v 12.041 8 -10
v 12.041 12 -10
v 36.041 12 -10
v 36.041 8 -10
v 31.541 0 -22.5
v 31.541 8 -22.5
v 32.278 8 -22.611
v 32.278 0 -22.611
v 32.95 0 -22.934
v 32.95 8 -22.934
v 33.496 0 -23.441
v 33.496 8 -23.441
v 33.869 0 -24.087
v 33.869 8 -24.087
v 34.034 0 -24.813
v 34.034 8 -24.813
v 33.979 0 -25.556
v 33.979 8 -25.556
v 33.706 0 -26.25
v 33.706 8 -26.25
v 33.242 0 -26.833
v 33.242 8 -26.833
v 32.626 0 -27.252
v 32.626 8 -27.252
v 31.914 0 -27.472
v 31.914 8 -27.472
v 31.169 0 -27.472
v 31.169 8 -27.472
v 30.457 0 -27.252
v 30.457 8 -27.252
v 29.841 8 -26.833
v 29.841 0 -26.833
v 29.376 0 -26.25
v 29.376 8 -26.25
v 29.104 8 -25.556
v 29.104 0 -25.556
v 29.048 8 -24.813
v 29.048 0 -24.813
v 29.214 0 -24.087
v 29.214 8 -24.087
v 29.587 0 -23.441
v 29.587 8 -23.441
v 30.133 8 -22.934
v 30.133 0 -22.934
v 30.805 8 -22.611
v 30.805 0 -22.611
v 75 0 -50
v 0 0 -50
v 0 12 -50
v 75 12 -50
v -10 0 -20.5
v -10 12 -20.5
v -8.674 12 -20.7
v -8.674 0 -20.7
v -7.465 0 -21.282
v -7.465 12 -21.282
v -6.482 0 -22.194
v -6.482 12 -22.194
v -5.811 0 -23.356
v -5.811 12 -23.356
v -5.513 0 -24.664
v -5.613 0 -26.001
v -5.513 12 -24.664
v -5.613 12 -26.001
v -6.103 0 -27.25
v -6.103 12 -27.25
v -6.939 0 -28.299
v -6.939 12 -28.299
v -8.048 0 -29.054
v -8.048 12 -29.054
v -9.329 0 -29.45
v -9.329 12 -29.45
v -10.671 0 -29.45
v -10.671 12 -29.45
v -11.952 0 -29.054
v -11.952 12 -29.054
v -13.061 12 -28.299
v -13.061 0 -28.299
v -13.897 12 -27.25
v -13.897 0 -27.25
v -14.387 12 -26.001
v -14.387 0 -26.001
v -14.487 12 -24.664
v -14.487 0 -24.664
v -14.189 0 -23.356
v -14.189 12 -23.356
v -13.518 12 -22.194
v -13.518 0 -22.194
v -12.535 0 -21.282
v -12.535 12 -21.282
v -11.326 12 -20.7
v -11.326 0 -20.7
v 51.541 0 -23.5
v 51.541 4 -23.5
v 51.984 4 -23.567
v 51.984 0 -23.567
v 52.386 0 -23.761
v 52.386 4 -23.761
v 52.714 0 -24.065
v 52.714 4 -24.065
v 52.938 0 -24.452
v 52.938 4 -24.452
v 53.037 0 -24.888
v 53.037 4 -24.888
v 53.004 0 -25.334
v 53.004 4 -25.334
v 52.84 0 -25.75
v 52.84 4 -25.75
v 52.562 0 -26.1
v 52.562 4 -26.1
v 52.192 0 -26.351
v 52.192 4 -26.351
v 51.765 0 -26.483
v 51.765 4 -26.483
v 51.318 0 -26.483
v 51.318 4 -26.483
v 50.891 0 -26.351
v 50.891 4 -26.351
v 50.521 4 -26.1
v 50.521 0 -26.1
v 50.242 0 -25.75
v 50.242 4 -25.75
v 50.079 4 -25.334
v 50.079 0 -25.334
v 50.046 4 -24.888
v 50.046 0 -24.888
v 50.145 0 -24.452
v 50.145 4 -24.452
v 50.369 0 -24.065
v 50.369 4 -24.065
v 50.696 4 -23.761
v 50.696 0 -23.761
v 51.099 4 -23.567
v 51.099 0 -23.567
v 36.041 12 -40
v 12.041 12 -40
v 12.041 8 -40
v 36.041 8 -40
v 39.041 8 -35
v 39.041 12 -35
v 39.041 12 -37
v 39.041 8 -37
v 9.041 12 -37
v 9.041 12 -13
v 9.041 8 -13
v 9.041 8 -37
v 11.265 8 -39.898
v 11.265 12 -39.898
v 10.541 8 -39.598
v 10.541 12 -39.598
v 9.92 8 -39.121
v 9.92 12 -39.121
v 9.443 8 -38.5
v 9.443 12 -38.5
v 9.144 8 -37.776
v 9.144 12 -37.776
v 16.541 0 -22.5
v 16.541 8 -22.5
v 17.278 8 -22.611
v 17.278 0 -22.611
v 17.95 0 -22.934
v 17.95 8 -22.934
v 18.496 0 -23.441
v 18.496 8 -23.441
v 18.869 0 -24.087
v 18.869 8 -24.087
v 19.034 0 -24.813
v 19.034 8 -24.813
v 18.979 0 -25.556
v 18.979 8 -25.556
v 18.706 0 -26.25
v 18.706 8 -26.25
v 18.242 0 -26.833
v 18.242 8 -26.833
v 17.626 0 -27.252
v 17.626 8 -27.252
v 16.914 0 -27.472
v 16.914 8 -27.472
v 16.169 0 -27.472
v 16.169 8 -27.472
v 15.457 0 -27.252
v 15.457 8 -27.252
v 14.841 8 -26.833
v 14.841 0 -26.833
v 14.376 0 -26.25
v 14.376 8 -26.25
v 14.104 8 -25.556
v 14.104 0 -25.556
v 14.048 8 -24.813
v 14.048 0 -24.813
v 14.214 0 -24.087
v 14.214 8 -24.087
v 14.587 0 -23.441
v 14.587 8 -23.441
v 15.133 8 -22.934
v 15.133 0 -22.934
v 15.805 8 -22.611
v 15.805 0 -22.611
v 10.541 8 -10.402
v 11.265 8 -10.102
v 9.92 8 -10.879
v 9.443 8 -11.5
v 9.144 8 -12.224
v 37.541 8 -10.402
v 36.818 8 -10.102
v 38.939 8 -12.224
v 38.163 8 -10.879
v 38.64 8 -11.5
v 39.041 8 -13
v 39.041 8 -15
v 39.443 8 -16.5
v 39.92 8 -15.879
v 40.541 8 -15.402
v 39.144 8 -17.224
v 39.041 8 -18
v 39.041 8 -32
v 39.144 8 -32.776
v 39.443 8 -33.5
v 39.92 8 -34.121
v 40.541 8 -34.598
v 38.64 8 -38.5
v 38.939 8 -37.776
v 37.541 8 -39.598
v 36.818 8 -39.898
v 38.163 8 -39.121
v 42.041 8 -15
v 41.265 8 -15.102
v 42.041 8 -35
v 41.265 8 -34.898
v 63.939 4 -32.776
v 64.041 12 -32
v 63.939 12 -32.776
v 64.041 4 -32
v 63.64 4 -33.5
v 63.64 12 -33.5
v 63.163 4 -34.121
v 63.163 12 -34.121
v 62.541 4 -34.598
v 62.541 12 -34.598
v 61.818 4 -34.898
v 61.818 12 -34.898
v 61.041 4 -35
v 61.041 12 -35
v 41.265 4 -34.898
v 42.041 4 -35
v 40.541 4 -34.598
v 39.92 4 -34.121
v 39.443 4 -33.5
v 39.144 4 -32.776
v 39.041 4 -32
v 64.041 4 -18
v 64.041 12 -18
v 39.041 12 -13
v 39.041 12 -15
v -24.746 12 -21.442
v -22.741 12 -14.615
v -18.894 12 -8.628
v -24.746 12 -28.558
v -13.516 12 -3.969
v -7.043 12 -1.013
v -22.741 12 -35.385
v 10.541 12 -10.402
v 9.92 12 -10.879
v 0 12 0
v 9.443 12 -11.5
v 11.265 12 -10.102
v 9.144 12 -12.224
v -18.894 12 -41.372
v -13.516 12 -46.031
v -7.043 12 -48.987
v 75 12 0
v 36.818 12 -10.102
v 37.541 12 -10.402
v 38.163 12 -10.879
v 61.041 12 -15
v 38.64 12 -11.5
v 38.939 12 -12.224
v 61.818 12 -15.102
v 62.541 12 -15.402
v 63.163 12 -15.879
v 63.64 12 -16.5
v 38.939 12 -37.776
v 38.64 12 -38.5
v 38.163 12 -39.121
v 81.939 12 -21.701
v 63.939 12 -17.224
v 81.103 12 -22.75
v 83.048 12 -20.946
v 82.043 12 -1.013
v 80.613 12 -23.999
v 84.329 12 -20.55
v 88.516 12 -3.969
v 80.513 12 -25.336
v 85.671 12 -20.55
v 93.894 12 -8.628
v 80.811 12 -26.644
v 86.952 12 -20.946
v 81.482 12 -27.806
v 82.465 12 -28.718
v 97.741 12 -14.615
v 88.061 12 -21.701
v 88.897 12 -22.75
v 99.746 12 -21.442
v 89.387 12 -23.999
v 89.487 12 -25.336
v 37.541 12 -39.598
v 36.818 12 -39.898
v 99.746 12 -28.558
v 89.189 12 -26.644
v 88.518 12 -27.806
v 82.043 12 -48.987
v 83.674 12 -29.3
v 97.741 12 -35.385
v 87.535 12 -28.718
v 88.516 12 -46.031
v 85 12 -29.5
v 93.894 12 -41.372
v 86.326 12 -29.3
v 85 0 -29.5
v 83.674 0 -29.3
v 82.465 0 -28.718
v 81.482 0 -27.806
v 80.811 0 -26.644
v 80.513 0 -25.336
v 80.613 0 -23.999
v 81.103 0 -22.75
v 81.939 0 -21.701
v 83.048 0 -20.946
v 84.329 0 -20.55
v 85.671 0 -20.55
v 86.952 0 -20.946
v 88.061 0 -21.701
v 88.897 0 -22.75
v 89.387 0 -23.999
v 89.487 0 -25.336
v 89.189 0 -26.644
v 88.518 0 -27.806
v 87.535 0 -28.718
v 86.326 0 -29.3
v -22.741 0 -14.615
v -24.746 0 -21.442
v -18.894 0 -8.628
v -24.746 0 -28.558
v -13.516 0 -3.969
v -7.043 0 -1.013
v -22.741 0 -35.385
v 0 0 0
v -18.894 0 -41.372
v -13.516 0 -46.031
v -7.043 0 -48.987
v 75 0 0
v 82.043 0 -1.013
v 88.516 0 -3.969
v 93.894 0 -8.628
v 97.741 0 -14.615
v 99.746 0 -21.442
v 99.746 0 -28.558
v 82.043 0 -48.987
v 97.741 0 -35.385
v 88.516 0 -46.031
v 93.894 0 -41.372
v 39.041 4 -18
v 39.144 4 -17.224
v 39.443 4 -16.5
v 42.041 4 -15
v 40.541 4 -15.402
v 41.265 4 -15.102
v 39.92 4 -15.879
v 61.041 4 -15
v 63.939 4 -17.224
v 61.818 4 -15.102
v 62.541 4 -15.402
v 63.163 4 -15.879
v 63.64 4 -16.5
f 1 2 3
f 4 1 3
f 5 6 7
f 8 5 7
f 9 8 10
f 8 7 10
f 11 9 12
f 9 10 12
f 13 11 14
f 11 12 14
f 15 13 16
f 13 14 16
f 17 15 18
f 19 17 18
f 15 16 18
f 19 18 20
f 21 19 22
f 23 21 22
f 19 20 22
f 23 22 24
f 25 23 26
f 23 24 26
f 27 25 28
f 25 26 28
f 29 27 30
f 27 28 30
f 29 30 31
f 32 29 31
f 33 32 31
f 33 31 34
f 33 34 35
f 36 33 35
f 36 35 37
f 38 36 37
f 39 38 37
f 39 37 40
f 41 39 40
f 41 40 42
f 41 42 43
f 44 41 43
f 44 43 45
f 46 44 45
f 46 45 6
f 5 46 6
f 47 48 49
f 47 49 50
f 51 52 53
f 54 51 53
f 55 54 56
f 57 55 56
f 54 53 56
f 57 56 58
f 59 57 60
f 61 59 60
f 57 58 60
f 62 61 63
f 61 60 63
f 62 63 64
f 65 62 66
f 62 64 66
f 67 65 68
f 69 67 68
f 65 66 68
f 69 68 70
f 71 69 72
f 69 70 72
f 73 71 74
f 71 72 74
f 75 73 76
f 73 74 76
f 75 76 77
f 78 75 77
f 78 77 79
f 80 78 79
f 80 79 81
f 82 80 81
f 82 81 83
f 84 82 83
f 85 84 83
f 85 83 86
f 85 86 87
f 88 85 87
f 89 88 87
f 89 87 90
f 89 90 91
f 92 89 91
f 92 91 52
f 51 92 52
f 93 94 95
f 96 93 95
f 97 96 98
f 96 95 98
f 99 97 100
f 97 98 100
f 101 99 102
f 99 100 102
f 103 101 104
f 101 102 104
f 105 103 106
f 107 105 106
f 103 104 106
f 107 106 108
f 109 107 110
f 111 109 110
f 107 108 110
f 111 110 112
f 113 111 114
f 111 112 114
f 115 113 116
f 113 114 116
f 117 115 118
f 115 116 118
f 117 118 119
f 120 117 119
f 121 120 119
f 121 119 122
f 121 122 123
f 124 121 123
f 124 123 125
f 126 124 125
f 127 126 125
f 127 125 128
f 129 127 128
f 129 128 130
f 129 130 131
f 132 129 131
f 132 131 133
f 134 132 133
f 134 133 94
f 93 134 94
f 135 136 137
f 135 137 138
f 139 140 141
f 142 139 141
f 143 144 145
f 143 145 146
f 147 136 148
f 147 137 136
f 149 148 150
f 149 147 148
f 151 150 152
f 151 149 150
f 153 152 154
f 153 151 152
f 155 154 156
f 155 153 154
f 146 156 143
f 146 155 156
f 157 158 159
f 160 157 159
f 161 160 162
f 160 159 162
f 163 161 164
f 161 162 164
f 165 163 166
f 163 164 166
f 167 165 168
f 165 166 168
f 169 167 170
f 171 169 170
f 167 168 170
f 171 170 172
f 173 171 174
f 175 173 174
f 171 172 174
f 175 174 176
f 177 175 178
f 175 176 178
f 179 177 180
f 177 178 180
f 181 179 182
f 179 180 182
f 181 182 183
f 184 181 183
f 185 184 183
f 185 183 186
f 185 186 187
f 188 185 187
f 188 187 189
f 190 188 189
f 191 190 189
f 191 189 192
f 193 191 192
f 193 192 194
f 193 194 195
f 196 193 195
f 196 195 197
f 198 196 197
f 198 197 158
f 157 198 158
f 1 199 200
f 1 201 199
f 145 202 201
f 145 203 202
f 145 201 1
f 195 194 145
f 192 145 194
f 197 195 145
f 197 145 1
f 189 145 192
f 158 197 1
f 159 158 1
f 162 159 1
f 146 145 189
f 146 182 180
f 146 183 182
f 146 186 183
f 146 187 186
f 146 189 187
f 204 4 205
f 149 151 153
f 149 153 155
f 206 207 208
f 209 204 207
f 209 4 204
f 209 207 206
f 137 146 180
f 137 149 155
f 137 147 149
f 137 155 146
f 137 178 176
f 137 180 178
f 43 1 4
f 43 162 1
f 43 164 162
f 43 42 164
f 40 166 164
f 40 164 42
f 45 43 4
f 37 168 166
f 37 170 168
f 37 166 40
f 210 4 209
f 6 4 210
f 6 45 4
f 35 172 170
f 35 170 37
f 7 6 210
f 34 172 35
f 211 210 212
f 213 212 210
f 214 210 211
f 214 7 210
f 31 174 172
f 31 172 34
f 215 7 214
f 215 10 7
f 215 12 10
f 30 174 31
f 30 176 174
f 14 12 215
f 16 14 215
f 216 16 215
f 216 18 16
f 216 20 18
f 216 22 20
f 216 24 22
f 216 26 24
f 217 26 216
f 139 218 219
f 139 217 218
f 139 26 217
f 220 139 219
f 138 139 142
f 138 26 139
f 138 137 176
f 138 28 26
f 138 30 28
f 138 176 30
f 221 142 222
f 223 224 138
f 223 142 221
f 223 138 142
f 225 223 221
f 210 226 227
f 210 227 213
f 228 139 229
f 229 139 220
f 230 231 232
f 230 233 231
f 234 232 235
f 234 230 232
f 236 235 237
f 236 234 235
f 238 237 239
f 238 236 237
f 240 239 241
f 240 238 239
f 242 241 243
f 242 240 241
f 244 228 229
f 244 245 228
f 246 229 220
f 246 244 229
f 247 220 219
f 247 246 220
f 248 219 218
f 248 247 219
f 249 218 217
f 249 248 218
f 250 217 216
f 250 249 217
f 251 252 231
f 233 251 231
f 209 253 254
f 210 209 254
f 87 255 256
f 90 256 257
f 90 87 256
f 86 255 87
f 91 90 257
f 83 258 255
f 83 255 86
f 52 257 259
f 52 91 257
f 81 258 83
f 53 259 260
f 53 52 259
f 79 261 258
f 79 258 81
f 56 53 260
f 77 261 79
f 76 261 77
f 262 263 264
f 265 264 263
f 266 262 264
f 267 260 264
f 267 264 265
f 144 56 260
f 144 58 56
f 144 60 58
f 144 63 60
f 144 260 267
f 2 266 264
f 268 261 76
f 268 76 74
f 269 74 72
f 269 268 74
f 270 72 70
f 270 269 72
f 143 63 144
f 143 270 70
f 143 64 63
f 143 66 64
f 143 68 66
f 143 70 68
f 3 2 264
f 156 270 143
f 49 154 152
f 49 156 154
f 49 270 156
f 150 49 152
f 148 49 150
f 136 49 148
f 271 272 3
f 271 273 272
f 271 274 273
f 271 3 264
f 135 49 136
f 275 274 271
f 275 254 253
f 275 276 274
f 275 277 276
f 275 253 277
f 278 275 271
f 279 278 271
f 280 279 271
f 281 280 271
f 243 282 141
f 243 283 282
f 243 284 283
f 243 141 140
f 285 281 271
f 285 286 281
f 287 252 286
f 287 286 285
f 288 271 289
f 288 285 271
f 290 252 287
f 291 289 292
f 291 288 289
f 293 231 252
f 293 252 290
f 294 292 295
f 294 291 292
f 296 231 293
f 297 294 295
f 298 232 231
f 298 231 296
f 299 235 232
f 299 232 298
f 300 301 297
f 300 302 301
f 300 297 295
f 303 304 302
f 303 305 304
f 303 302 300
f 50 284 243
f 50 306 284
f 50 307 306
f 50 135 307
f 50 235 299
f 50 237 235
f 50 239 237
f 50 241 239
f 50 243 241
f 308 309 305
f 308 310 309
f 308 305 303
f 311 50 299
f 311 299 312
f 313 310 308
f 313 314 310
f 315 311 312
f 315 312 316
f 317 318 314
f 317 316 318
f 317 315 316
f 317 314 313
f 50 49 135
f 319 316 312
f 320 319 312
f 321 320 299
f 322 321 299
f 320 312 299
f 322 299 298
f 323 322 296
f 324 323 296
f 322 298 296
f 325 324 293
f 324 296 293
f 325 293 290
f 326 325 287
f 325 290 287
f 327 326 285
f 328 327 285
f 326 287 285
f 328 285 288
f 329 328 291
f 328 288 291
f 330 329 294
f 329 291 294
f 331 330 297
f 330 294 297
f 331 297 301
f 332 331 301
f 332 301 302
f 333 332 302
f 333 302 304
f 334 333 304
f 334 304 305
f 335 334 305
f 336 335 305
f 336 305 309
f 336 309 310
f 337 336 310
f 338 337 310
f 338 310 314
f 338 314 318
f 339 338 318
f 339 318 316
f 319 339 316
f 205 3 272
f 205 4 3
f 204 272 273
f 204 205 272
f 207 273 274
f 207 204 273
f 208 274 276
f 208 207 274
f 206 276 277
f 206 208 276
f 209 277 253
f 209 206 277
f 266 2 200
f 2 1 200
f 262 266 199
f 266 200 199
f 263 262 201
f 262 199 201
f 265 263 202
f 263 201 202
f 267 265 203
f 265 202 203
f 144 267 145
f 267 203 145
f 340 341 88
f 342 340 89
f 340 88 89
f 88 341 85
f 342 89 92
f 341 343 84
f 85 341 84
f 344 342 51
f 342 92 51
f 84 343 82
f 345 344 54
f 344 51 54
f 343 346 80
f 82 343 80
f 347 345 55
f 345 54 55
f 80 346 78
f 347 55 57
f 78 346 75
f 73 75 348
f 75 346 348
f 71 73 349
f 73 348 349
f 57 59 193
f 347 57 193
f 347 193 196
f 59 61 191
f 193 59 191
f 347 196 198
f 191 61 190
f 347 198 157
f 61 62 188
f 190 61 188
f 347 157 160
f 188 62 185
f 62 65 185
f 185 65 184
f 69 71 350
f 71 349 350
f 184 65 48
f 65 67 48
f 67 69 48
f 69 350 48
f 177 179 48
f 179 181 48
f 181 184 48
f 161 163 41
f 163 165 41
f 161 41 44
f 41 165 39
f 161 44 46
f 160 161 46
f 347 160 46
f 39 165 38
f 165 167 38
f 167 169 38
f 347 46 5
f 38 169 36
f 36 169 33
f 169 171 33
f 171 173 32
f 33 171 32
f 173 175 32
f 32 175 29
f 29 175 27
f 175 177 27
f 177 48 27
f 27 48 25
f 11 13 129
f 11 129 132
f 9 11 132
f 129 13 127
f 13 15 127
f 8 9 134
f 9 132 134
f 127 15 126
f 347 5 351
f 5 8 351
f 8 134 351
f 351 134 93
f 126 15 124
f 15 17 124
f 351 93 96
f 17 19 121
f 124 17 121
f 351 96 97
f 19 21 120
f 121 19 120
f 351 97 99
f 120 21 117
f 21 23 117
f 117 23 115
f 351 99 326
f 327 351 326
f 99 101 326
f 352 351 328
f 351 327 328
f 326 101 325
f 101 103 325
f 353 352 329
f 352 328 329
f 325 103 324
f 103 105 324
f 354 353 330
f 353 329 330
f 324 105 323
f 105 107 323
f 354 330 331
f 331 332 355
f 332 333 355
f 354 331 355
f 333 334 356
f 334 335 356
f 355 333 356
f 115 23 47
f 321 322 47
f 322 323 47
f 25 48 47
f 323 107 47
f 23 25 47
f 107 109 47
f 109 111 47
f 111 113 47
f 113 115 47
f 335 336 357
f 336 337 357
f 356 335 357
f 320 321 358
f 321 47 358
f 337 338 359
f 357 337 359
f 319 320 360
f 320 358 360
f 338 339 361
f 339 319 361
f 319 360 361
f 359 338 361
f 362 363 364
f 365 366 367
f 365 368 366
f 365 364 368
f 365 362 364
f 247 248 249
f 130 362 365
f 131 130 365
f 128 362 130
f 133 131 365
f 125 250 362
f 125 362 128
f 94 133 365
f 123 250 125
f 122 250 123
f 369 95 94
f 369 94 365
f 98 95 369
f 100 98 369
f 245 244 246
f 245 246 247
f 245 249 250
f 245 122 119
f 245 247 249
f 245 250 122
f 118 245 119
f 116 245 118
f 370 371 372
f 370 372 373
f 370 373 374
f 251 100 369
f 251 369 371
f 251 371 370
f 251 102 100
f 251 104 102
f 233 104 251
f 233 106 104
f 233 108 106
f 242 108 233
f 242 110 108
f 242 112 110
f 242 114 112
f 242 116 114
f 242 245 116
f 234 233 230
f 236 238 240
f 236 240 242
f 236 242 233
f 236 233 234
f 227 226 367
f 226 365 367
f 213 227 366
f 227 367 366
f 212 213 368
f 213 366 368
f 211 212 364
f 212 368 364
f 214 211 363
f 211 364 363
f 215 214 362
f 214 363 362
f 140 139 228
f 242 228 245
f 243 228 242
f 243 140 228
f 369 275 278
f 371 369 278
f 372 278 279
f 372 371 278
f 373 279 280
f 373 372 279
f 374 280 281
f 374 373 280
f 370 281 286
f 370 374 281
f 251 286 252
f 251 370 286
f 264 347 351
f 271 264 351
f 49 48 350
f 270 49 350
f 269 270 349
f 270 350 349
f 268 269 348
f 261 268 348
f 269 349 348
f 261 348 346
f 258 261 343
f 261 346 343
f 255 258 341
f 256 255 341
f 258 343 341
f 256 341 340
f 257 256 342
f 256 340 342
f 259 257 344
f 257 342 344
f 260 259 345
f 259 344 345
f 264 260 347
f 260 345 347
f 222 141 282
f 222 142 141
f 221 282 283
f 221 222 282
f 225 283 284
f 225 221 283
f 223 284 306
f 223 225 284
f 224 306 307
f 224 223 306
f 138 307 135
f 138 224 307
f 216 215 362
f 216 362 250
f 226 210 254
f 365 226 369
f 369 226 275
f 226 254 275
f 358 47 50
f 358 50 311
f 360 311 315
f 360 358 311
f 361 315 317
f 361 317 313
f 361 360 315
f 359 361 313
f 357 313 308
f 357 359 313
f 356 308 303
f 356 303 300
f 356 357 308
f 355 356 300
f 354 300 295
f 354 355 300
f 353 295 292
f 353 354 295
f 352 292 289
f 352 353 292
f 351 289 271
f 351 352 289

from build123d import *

# Parameters (mm, degrees)
SKETCH1_W           = 75
SKETCH1_H           = 50
BOSS_EXTRUDE1_DEPTH = 12
SKETCH2_R           = 4.5
CUT_EXTRUDE1_DEPTH  = 113.445542375
SKETCH3_W           = 30
SKETCH3_H           = 30
CUT_EXTRUDE2_DEPTH  = 4
SKETCH4_W           = 25
SKETCH4_H           = 20
CUT_EXTRUDE3_DEPTH  = 8
FILLET1_R           = 3
SKETCH5_R           = 1.5
CUT_EXTRUDE4_DEPTH  = 113.089250154
SKETCH6_R           = 2.5
CUT_EXTRUDE5_DEPTH  = 113.089250154


with BuildPart() as part:
    # Sketch1 → Boss-Extrude1 (new body)
    with BuildSketch(Plane(origin=(0, 0, 0), x_dir=(1, 0, 0), z_dir=(0, 1, 0))):
        with Locations((37.5, 25)):
            Rectangle(SKETCH1_W, SKETCH1_H)
        with BuildLine():
            Line((75, 0), (75, 50))
            ThreePointArc((75, 50), (100, 25), (75, 0))
        make_face()
        with BuildLine():
            Line((0, 0), (0, 50))
            ThreePointArc((0, 50), (-25, 25), (0, 0))
        make_face()
    extrude(amount=BOSS_EXTRUDE1_DEPTH)

    # Sketch2 → Cut-Extrude1 (cut, through all)
    with BuildSketch(Plane(origin=(0, 12, 0), x_dir=(1, 0, 0), z_dir=(0, 1, 0))):
        with Locations(Location((-10, 25, 0), (0, 0, 270))):
            Circle(SKETCH2_R)
        with Locations(Location((85, 25, 0), (0, 0, 90))):
            Circle(SKETCH2_R)
    extrude(amount=-CUT_EXTRUDE1_DEPTH, mode=Mode.SUBTRACT)

    # Sketch3 → Cut-Extrude2 (cut)
    with BuildSketch(Plane(origin=(0, 12, 0), x_dir=(1, 0, 0), z_dir=(0, 1, 0))):
        with Locations((24.041436108, 25)):
            Rectangle(SKETCH3_W, SKETCH3_H)
    extrude(amount=-CUT_EXTRUDE2_DEPTH, mode=Mode.SUBTRACT)

    # Sketch4 → Cut-Extrude3 (cut)
    with BuildSketch(Plane(origin=(0, 12, 0), x_dir=(1, 0, 0), z_dir=(0, 1, 0))):
        with Locations((51.541436108, 25)):
            Rectangle(SKETCH4_W, SKETCH4_H)
    extrude(amount=-CUT_EXTRUDE3_DEPTH, mode=Mode.SUBTRACT)

    # Fillet1
    fillet1_edges = [part.edges().sort_by_distance(p)[0] for p in [
        (9.041436108, 10, -10),
        (9.041436108, 10, -40),
        (39.041436108, 10, -40),
        (39.041436108, 10, -10),
        (64.041436108, 8, -15),
        (39.041436108, 6, -15),
        (39.041436108, 6, -35),
        (64.041436108, 8, -35),
    ]]
    fillet(fillet1_edges, radius=FILLET1_R)

    # Sketch5 → Cut-Extrude4 (cut, through all)
    with BuildSketch(Plane(origin=(0, 4, 0), x_dir=(1, 0, 0), z_dir=(0, 1, 0))):
        with Locations(Location((51.541436108, 25, 0), (0, 0, 270))):
            Circle(SKETCH5_R)
    extrude(amount=-CUT_EXTRUDE4_DEPTH, mode=Mode.SUBTRACT)

    # Sketch6 → Cut-Extrude5 (cut, through all)
    with BuildSketch(Plane(origin=(0, 8, 0), x_dir=(1, 0, 0), z_dir=(0, 1, 0))):
        with Locations(Location((16.541436108, 25, 0), (0, 0, 270))):
            Circle(SKETCH6_R)
        with Locations(Location((31.541436108, 25, 0), (0, 0, 270))):
            Circle(SKETCH6_R)
    extrude(amount=-CUT_EXTRUDE5_DEPTH, mode=Mode.SUBTRACT)


solid = part.part
